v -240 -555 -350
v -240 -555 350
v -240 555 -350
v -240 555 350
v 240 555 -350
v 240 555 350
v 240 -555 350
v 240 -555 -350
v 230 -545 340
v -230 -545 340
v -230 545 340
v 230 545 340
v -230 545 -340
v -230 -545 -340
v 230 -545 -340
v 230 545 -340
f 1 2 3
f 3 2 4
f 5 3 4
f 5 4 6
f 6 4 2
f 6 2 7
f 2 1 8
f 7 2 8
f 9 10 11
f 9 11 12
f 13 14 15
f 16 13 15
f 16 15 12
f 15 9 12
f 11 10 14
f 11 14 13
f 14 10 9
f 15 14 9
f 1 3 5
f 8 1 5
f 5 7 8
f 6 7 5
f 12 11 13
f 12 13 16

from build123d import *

# Parameters (mm, degrees)
F0_W     = 480
F0_H     = 1110
F1_DEPTH = 350
F2_T     = -10


# Not quite as in the source:
# - the program builds the solid bodies; features that only make, move or delete a surface that nothing else refers to are left out


with BuildPart() as f1:
    # F0 (on Top) → F1 (new body, symmetric)
    with BuildSketch(Plane.XY):
        Rectangle(F0_W, F0_H)
    extrude(amount=F1_DEPTH, both=True)

    # F2 (hollow: no face is removed)
    offset(amount=F2_T, mode=Mode.SUBTRACT)


solid = f1.part
